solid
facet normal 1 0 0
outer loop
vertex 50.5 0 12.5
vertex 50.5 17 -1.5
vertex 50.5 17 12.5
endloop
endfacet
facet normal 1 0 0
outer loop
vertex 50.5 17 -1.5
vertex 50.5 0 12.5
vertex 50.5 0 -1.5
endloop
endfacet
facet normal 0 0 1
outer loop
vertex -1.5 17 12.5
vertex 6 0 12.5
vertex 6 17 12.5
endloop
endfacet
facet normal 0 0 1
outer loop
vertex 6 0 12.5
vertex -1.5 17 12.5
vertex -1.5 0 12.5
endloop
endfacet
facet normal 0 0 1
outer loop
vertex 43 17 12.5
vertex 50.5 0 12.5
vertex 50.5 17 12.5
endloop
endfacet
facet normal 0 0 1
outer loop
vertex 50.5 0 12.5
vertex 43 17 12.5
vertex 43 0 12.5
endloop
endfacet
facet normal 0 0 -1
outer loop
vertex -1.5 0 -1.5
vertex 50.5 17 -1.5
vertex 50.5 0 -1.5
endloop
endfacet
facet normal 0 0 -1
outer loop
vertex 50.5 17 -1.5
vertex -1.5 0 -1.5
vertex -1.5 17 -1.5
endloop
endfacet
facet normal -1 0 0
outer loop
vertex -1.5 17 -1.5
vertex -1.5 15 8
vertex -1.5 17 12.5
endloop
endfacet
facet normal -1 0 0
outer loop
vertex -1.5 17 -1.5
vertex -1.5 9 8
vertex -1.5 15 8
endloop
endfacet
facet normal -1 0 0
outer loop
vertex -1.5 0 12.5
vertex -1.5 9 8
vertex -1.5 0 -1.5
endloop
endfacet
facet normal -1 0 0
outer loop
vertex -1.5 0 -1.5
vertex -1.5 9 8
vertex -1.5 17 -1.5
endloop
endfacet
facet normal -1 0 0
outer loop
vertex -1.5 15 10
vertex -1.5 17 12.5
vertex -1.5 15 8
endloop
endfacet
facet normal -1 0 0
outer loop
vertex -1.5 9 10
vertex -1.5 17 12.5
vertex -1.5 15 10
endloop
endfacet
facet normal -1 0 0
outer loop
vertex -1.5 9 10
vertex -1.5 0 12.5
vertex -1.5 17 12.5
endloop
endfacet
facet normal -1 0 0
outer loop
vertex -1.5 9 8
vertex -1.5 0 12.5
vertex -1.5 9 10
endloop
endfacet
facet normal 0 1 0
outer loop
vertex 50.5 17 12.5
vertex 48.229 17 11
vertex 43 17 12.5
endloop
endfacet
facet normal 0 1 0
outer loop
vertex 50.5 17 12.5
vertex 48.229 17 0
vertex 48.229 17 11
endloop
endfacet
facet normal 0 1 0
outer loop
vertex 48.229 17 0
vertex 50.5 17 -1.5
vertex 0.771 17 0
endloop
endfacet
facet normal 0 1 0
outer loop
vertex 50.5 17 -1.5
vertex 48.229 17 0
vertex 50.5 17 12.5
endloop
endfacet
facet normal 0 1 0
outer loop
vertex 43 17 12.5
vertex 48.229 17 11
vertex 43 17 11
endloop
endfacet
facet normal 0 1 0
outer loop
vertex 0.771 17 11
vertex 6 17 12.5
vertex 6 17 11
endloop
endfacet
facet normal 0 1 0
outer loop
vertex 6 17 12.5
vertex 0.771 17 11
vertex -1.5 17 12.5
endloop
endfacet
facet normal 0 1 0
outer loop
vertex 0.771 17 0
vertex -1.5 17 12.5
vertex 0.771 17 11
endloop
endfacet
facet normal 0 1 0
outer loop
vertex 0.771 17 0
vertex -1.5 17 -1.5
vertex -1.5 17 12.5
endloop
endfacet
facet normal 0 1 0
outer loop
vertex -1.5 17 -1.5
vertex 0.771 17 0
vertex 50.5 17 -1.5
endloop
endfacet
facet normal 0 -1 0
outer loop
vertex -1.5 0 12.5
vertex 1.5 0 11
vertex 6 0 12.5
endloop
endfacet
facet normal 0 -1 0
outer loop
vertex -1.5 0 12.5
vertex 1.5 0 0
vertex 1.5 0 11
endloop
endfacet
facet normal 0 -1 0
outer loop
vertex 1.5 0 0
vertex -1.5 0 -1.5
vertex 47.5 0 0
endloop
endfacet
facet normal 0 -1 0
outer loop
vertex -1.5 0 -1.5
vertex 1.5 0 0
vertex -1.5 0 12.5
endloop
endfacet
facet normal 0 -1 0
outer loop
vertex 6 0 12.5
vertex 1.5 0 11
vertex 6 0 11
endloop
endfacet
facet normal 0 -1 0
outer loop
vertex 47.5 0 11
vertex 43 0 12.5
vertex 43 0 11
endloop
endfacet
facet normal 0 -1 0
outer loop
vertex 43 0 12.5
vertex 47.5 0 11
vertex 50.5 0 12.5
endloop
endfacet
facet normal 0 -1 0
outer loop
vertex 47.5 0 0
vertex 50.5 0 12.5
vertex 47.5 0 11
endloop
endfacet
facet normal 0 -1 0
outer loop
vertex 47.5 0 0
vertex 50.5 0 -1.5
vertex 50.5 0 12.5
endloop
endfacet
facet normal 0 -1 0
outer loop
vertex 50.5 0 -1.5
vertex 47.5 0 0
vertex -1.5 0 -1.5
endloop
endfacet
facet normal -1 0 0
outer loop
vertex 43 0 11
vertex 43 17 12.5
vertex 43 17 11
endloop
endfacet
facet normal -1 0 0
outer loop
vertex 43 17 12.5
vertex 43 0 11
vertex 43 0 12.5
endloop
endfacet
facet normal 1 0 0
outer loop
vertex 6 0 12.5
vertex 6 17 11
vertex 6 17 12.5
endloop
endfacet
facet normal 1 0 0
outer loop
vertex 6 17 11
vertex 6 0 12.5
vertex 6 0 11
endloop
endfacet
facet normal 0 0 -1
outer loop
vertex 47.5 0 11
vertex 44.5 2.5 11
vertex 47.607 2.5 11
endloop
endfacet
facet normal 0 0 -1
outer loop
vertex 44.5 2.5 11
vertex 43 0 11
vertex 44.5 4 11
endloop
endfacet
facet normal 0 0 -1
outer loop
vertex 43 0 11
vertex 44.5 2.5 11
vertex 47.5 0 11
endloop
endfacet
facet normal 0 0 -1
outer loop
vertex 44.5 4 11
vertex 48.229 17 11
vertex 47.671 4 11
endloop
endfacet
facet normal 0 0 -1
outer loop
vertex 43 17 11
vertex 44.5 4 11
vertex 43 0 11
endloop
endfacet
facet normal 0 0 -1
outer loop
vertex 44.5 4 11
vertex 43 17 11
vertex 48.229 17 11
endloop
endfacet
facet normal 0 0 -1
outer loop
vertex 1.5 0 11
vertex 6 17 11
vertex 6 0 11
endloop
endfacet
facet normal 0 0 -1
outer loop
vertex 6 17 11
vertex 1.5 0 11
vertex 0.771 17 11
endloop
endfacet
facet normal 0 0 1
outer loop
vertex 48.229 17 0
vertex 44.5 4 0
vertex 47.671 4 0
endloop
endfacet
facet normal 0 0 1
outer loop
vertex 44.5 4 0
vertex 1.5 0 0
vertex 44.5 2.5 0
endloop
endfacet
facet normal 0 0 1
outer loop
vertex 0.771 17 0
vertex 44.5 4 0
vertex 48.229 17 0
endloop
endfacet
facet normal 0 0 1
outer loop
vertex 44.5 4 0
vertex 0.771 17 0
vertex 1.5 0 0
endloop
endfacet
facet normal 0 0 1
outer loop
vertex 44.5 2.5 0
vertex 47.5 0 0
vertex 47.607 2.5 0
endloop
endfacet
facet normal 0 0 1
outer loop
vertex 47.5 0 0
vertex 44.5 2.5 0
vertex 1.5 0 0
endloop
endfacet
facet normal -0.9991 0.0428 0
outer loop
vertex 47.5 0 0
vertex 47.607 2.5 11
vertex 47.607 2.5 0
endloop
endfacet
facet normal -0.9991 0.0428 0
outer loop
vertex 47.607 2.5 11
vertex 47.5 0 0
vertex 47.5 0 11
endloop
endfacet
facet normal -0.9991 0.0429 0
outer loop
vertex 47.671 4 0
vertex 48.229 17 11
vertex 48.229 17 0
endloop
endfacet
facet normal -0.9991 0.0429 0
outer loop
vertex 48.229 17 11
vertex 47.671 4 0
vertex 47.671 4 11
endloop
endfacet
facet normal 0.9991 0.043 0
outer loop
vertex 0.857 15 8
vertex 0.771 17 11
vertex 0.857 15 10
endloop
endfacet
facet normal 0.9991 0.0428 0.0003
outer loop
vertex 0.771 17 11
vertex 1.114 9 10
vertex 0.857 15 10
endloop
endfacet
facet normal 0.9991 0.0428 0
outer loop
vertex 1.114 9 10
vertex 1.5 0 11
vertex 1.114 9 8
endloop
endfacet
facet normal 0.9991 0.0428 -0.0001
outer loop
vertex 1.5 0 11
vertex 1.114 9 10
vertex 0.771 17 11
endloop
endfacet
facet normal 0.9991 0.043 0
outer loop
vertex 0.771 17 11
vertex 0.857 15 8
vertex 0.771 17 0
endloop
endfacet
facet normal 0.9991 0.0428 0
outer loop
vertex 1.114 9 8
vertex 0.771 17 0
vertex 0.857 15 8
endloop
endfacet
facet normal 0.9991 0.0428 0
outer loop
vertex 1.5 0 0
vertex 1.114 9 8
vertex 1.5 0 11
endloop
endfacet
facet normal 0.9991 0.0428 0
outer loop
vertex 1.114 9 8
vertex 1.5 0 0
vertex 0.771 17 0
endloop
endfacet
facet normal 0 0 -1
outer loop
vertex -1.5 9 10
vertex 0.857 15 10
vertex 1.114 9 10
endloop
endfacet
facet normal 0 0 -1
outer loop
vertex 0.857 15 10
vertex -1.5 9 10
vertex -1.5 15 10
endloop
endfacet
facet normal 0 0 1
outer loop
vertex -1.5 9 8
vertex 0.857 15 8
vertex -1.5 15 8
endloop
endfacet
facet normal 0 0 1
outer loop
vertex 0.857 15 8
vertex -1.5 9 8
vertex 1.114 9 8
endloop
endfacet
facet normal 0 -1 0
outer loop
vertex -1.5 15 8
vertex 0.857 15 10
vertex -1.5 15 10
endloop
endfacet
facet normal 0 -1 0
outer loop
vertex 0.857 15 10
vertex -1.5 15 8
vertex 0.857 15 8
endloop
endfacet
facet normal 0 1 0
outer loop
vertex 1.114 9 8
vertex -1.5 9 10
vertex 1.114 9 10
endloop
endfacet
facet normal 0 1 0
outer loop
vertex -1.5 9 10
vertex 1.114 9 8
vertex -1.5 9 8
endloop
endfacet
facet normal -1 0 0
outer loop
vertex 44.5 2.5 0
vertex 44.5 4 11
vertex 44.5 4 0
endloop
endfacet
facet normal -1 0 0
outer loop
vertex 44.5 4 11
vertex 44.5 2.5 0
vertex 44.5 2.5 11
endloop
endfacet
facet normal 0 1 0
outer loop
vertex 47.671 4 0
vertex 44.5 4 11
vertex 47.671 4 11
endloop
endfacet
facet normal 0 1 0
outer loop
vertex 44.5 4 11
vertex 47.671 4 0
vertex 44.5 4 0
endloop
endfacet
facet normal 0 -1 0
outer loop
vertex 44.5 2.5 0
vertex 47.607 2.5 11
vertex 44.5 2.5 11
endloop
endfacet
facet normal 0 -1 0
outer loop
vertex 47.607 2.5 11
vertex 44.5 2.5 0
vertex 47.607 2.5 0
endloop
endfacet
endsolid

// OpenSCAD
RECON_HEIGHT = 11;
RECON_START_WIDTH = 46;
RECON_END_WIDTH = 49;
RECON_LENGTH = 35;

CLIP_LENGTH = 17;
CLIP_DEPTH = 6;
CLIP_THICKNESS = 3;

module recon() {
	hull() {
		translate([(RECON_END_WIDTH - RECON_START_WIDTH) / 2,0,0]) cube([RECON_START_WIDTH, 1, RECON_HEIGHT]);
		translate([0, RECON_LENGTH, 0]) cube([RECON_END_WIDTH, 1, RECON_HEIGHT]);
	}
	
	//notch
	#translate([-2,9,RECON_HEIGHT - 3]) cube([4,6,2]);
}

module clip() {

	RECON_BUMP_WIDTH = RECON_END_WIDTH - (CLIP_DEPTH * 2);

	difference() {
	translate([(-1*CLIP_THICKNESS) / 2, 0, (-1*CLIP_THICKNESS) / 2]) 
	difference() {
	cube([RECON_END_WIDTH + CLIP_THICKNESS, CLIP_LENGTH, RECON_HEIGHT + CLIP_THICKNESS]);
	translate([CLIP_DEPTH + (CLIP_THICKNESS / 2),0,CLIP_THICKNESS]) cube([RECON_BUMP_WIDTH, CLIP_LENGTH, RECON_HEIGHT + CLIP_THICKNESS]);	
	}
	recon();
	}

	#translate([RECON_START_WIDTH - (CLIP_THICKNESS / 2),2.5,0]) cube([4,1.5,RECON_HEIGHT]);

}

//recon();
clip();
